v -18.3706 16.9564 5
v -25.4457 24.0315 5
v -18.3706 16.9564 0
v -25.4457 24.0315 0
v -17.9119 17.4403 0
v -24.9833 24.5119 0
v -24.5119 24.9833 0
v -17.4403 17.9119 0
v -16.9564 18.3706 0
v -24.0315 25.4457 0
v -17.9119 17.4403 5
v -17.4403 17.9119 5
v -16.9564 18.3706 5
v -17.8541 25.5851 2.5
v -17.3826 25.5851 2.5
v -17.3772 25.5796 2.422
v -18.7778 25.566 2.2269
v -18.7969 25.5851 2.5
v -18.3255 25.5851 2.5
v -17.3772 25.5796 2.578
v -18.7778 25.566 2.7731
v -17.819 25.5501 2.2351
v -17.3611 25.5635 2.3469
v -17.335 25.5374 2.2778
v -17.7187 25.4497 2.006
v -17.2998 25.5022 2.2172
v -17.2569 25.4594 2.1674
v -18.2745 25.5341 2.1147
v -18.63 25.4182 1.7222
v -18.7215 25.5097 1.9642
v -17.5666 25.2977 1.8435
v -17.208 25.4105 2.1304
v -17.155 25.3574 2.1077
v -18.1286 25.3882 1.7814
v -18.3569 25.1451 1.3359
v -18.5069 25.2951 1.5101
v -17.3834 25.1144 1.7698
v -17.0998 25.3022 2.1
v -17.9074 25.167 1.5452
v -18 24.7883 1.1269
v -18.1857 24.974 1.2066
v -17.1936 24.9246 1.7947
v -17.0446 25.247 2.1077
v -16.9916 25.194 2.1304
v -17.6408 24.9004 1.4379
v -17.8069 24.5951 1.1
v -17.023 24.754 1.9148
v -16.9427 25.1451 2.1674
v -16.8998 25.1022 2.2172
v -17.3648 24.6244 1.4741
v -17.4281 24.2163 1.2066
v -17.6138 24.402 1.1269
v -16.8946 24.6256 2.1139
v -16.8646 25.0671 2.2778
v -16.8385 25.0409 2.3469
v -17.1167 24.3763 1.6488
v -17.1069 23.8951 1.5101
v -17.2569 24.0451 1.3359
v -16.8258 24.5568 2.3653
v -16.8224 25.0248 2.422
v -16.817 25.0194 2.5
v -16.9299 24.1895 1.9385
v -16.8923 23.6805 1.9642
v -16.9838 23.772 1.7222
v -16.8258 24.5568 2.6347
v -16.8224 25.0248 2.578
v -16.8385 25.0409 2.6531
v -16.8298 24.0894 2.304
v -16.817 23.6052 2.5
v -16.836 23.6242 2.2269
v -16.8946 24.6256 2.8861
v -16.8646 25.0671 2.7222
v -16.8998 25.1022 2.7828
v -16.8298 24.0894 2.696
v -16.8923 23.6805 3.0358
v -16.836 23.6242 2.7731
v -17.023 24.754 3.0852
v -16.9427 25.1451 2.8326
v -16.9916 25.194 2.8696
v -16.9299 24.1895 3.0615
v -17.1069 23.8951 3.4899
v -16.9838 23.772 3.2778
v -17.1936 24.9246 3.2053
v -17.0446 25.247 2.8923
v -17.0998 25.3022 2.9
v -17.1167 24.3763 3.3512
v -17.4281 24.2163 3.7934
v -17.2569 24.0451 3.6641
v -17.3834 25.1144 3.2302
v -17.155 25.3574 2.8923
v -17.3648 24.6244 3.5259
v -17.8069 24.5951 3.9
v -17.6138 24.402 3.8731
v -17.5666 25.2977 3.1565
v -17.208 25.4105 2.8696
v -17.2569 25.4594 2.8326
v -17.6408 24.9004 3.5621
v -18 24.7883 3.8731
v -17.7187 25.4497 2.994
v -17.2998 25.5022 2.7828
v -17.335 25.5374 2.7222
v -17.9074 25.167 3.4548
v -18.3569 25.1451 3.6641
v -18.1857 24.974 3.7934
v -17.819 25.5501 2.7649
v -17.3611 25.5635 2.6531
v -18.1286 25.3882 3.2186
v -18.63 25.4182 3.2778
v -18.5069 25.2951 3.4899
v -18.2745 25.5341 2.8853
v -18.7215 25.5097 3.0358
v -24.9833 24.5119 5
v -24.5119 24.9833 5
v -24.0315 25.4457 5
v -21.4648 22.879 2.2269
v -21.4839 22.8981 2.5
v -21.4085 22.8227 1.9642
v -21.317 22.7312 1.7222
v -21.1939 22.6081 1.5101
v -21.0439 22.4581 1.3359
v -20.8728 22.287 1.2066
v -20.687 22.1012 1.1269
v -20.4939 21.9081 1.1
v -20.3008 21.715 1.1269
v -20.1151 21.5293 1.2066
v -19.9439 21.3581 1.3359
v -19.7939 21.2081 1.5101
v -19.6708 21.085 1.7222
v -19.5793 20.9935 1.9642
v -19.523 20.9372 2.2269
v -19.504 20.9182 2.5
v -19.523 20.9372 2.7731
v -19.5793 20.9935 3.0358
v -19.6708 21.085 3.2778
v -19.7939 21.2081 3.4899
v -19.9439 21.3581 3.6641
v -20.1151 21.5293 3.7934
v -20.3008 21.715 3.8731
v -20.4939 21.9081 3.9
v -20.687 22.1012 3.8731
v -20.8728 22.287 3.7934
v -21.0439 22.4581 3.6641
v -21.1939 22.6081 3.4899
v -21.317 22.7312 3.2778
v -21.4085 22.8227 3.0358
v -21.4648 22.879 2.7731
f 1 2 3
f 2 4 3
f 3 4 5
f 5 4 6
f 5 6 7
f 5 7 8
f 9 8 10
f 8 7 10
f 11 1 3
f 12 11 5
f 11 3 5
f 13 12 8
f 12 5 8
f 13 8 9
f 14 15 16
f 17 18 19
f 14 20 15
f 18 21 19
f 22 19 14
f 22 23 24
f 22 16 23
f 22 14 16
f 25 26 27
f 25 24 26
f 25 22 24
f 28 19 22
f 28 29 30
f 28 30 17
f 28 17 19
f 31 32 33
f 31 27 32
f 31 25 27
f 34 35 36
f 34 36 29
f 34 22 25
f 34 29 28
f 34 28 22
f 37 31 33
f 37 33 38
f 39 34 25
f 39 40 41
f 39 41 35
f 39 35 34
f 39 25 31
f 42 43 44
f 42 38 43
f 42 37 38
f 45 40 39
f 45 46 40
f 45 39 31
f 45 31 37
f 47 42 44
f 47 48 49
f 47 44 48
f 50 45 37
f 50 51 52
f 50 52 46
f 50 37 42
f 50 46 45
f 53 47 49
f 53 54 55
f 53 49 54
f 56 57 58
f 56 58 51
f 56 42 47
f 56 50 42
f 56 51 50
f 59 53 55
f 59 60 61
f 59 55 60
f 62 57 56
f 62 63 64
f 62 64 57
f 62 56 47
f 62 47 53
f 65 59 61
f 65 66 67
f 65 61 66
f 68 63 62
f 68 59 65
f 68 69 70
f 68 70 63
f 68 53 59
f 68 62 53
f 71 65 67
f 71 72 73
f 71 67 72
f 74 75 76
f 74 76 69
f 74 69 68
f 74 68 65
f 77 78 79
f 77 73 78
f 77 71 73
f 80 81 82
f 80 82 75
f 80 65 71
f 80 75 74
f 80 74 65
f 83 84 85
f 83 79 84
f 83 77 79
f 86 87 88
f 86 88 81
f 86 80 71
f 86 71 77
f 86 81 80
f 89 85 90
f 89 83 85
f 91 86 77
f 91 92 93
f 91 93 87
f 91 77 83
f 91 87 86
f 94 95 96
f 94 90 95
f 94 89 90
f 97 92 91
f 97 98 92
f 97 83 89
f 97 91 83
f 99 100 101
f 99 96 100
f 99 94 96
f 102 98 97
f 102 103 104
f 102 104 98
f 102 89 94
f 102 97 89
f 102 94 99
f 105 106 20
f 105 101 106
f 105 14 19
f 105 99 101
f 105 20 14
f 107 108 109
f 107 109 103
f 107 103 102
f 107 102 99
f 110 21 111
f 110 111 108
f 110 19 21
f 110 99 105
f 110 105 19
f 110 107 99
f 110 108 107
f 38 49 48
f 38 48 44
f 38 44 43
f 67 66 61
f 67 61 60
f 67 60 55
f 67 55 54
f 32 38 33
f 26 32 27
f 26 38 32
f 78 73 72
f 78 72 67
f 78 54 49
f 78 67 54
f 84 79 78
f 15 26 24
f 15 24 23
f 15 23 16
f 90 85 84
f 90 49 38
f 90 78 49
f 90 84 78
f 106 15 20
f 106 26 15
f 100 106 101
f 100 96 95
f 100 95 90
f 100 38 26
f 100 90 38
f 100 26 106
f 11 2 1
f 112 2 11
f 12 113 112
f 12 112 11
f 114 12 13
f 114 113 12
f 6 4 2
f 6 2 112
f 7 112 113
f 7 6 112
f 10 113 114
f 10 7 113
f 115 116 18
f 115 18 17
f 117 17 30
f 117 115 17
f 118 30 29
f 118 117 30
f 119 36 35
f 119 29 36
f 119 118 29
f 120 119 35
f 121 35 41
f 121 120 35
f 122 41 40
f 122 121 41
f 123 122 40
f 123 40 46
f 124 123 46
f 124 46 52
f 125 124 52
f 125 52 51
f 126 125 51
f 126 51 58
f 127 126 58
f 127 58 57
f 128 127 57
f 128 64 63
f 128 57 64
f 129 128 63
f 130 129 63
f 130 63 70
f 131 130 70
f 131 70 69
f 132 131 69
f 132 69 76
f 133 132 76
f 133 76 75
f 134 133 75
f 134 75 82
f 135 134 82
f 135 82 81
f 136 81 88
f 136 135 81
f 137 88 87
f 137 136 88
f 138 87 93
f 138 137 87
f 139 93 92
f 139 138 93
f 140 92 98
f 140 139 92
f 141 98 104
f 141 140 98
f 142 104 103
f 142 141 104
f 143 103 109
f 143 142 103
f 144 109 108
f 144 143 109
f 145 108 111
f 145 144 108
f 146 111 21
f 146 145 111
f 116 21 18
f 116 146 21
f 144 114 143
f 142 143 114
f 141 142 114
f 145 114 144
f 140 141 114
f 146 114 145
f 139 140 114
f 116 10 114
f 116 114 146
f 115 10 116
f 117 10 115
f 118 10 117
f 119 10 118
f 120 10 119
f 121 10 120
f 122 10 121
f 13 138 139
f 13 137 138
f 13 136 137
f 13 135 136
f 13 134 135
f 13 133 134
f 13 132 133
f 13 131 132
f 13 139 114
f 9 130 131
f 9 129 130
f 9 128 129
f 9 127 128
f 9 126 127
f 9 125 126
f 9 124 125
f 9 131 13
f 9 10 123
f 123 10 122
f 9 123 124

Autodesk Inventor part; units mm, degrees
ref_plane "YZ Plane" through (0, 0, 0) normal (1, 0, 0) x (0, 1, 0)
ref_plane "XZ Plane" through (0, 0, 0) normal (0, 1, 0) x (-1, 0, 0)
ref_plane "XY Plane" through (0, 0, 0) normal (0, 0, 1) x (1, 0, 0)
sketch "Sketch1" plane through (0, 0, 0) normal (0, 0, 1) x (1, 0, 0)
  circle A0 centre (0, 0) radius 25
  circle A1 centre (0, 0) radius 35
  line L0 (-17.6777, 17.6777) -> (-24.7487, 24.7487)
  line L1 (0, 35) -> (0, 0) construction
  line L2 (-24.0315, 25.4457) -> (-16.9564, 18.3706)
  line L3 (-1.1667, 34.9806) -> (-1.1667, 34.9972)
  line L4 (1.1667, 34.9806) -> (1.1667, 34.9972)
  line L5 (17.6777, 17.6777) -> (24.7487, 24.7487)
  line L6 (24.0315, 25.4457) -> (16.9564, 18.3706)
  line L7 (-25.4457, 24.0315) -> (-18.3706, 16.9564)
  line L8 (25.4457, 24.0315) -> (18.3706, 16.9564)
  line L9 (-1, 15) -> (1, 15)
  line L10 (1, 15) -> (1, 0)
  line L11 (1, 0) -> (-1, 0)
  line L12 (-1, 0) -> (-1, 15)
  line L13 (-1, 0) -> (1, 0)
  line L14 (1, 0) -> (1, -6)
  line L15 (1, -6) -> (-1, -6)
  line L16 (-1, -6) -> (-1, 0)
  line L17 (-1, -6) -> (-5, -6)
  line L18 (-5, -6) -> (-5, 3)
  line L19 (-5, 3) -> (-1, 3)
  line L20 (-1, 3) -> (-1, -6)
  line L21 (-5, 3) -> (-21.2192, -13.2192)
  line L22 (-5, -6) -> (-17.1706, -18.1706)
  line L23 (-5, 3) -> (-1, 15)
  line L24 (-5, -6) -> (-1, -2)
  line L25 (1, 0) -> (1, 15)
  line L26 (1, -6) -> (1, 0)
  line L27 (5, 3) -> (21.2192, -13.2192)
  line L28 (5, -6) -> (17.1706, -18.1706)
  line L29 (5, 3) -> (1, 15)
  line L30 (5, -6) -> (1, -2)
  point P0 (-20.5061, 21.9203)
  point P1 (-21.9203, 20.5061)
  point P2 (20.5061, 21.9203)
  point P3 (21.9203, 20.5061)
  point P4 (-1, -2)
  point P5 (1, 0)
  point P6 (1, -2)
  dimension "d0" = 50
  dimension "d1" = 10
  dimension "d2" = 45
  dimension "d3" = 1
  dimension "d5" = 2
  dimension "d6" = 15
  dimension "d7" = 6
  dimension "d8" = 2
  dimension "d9" = 4
  dimension "d11" = 45
  dimension "d12" = 45
  dimension "d13" = 3
  dimension "d14" = 45
extrude "Extrusion1" add sketch "Sketch1" along normal blind 5 contours A0 L0 A1 L2 | A1 L0 A0 L7
sketch "Sketch3" plane through (-24.0315, 25.4457, 0) normal (0.7071, 0.7071, 0) x (-0.7071, 0.7071, 0)
  line L0 (-10.0057, 5) -> (0, 5) construction
  line L1 (-10.0057, 0) -> (-10.0057, 5) construction
  circle A0 centre (-5.0029, 2.5) radius 1.4
  point P0 (-34.9857, 0)
  dimension "d19" = 2.8
  dimension "d20" = 2.5
  dimension "d21" = 5.0029
extrude "Extrusion3" add sketch "Sketch3" along normal blind 4.8
chamfer "Chamfer1" distance 1 angle 45 1 edges at (-16.1099, 24.3123, 2.5)
properties part number "Black_Part1"
